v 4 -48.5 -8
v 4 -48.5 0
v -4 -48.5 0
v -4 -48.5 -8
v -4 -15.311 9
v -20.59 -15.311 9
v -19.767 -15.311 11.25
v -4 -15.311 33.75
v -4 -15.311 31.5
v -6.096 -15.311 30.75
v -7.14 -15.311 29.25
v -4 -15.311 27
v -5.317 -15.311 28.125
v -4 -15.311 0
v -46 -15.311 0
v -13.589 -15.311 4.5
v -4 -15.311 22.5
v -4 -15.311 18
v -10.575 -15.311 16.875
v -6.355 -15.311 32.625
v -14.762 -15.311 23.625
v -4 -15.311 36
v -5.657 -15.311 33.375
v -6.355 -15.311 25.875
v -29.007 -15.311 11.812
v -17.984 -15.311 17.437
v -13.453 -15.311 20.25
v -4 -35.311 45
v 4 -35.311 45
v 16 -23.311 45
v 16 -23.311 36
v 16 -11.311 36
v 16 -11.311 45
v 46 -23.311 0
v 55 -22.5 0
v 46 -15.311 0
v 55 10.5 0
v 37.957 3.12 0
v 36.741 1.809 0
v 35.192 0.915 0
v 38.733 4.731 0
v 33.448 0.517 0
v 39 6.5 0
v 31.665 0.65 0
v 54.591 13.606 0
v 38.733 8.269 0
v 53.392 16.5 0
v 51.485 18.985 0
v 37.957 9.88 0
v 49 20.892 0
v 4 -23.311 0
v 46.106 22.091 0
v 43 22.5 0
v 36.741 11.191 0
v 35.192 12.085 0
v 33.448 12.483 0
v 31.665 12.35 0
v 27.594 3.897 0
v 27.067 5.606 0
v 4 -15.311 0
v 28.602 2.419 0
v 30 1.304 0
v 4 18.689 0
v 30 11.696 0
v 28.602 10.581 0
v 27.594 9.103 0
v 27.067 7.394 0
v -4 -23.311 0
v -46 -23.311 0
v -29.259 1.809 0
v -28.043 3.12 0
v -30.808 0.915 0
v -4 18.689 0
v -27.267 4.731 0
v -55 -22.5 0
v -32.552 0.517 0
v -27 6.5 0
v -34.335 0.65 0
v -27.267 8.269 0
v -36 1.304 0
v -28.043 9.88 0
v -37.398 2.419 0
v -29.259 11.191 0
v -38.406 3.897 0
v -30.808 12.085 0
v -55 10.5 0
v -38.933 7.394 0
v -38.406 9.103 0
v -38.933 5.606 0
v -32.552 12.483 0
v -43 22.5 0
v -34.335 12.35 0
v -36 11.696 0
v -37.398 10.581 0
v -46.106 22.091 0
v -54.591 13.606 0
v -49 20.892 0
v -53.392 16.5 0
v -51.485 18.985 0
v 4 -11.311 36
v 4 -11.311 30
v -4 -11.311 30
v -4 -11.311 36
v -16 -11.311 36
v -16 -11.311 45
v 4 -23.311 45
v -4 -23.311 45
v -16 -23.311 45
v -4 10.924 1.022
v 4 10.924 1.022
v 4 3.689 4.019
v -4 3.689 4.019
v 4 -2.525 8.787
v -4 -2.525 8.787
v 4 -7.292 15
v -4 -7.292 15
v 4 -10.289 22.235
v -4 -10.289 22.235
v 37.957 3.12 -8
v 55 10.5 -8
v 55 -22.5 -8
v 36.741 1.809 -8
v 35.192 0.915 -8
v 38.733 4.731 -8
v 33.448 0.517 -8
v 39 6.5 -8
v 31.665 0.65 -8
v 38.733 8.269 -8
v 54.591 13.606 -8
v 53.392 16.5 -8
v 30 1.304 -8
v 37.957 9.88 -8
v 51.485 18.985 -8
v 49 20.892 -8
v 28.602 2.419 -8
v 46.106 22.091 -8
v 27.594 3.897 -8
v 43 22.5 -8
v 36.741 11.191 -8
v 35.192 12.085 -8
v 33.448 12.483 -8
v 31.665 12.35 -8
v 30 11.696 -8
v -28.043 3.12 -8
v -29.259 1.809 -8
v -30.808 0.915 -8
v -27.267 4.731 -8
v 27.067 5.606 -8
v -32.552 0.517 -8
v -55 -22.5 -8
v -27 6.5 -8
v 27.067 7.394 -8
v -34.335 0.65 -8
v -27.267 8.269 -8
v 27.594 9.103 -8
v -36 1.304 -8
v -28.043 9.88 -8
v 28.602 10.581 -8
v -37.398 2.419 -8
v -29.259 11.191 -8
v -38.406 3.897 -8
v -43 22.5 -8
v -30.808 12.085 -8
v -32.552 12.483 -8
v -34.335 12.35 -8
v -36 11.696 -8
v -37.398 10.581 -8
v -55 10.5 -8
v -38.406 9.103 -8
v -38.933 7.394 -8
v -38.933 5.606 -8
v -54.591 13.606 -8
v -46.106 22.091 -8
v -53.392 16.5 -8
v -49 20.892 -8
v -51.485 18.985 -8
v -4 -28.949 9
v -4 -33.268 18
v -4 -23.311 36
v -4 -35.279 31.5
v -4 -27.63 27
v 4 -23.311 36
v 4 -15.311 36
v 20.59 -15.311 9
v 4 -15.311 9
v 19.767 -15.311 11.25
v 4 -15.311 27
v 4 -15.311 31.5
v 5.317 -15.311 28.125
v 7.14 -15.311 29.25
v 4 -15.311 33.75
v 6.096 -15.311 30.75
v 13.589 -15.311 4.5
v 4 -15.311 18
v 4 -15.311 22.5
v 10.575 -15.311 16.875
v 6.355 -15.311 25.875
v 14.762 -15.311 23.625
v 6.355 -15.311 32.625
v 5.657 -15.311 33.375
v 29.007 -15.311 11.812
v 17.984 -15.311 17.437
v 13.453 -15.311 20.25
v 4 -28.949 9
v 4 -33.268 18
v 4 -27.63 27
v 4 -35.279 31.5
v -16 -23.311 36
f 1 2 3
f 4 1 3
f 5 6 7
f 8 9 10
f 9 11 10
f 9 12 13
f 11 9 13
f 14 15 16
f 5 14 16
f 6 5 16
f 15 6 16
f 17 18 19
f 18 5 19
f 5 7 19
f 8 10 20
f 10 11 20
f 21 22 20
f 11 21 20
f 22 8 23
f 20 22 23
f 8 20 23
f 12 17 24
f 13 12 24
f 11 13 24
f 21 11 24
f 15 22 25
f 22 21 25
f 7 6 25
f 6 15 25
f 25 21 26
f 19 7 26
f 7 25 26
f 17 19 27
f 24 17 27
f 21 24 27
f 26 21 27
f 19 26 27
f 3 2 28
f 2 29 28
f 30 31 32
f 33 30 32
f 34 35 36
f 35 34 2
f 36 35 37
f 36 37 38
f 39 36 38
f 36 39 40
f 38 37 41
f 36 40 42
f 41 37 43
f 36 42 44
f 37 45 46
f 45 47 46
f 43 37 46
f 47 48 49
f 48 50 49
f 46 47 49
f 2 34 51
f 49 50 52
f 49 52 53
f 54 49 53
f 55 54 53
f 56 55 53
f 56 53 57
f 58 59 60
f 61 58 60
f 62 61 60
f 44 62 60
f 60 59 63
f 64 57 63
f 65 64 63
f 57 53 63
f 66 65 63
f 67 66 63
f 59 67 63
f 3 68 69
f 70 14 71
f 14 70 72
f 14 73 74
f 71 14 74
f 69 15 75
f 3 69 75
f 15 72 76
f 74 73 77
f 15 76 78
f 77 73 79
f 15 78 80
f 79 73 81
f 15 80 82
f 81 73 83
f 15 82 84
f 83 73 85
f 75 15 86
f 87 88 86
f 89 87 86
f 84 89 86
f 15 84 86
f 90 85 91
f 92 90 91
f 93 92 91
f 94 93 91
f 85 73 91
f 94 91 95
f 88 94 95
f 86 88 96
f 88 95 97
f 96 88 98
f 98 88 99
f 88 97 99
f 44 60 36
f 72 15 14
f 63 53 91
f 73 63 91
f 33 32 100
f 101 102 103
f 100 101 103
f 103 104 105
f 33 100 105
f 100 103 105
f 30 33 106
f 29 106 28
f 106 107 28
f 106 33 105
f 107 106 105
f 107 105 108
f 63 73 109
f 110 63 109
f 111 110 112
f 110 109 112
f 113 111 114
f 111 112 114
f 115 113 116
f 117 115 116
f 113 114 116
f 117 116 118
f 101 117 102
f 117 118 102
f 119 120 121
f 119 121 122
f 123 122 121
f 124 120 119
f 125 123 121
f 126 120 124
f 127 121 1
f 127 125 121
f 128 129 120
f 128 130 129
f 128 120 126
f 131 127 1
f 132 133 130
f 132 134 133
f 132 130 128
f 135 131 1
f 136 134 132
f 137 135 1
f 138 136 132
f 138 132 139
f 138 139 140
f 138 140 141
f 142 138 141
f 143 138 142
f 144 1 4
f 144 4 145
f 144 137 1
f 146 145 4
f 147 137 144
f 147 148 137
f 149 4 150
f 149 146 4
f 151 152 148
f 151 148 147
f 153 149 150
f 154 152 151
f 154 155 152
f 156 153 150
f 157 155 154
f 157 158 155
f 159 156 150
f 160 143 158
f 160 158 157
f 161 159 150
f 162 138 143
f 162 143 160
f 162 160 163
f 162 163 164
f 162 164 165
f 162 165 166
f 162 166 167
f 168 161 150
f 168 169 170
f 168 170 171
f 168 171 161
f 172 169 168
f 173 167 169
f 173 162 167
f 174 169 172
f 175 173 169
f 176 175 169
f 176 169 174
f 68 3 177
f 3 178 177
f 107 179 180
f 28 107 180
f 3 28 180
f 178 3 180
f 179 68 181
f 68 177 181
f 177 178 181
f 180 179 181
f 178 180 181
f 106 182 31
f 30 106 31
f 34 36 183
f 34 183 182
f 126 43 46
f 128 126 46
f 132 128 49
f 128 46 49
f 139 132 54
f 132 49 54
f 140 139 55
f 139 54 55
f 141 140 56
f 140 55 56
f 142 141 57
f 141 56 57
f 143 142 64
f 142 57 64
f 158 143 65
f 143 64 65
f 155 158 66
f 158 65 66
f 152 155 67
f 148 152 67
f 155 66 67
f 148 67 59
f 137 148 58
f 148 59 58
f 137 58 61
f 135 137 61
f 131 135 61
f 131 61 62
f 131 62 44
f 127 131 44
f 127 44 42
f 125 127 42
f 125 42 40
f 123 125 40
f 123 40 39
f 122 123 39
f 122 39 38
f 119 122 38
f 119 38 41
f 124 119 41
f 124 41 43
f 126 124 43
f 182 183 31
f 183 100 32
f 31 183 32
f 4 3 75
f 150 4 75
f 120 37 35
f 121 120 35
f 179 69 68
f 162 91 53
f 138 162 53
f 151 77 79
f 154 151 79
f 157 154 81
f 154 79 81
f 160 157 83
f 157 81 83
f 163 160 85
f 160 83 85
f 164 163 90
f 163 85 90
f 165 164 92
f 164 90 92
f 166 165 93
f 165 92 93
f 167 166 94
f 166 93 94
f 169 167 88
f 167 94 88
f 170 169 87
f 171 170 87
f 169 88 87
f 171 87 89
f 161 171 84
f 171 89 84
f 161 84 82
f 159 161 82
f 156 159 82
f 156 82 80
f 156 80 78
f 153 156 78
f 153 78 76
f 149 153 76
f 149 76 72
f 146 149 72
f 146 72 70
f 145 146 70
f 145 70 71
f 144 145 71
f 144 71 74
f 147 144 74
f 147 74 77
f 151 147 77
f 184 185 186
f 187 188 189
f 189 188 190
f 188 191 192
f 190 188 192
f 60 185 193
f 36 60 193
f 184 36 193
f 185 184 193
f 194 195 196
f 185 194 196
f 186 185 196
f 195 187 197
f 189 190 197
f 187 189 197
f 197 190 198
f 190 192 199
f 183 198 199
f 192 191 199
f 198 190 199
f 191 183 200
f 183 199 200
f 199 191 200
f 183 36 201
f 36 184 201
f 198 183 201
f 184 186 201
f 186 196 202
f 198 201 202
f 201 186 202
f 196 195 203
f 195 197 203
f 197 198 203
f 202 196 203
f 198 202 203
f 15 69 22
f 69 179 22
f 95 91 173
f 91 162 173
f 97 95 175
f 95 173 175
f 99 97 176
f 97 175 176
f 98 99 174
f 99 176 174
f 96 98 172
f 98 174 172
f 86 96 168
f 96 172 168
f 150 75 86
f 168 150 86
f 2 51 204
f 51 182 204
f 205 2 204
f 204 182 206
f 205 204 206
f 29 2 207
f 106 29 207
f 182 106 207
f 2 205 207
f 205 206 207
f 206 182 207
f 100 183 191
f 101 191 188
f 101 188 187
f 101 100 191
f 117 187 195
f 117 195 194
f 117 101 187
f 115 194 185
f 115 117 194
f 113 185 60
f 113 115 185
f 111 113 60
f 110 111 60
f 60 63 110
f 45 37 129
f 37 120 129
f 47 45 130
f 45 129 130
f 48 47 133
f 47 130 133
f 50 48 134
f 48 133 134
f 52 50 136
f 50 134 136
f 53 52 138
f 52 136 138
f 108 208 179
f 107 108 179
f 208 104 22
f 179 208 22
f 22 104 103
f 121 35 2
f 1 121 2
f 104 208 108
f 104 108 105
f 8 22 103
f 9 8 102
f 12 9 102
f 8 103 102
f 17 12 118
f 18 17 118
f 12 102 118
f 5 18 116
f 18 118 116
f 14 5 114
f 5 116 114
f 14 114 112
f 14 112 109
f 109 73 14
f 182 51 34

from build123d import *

# Parameters (mm, degrees)
BOSS_EXTRUDE1_DEPTH = 8
SKETCH4_W           = 32
SKETCH4_H           = 12
BOSS_EXTRUDE3_DEPTH = 9
RIB1_START          = -4
RIB1_DEPTH          = 8
FILLET1_R           = 12
SKETCH8_R           = 6
CUT_EXTRUDE1_DEPTH  = 9


# Read off the part's stored shape, not the designer's step: Rib1
with BuildPart() as part:
    # Sketch1 → Boss-Extrude1 (new body)
    with BuildSketch(Plane.XY):
        Polygon((-55, 22.5), (55, 22.5), (55, -22.5), (4, -48.5), (-4, -48.5), (-55, -22.5), align=None)
    extrude(amount=-BOSS_EXTRUDE1_DEPTH)

    # Sketch2 → Loft1 section 0
    with BuildSketch(Plane.XY):
        with BuildLine():
            Line((-46, -15.311496361), (46, -15.311496361))
            Line((46, -15.311496361), (46, -23.311496361))
            Line((46, -23.311496361), (-46, -23.311496361))
            Line((-46, -23.311496361), (-46, -15.311496361))
        make_face()
    # Sketch3 → Loft1 section 1
    with BuildSketch(Plane.XY.offset(36)):
        with BuildLine():
            Line((-4, -15.311496361), (4, -15.311496361))
            Line((4, -15.311496361), (4, -23.311496361))
            Line((4, -23.311496361), (-4, -23.311496361))
            Line((-4, -23.311496361), (-4, -15.311496361))
        make_face()
    loft()

    # Sketch4 → Boss-Extrude3 (add)
    with BuildSketch(Plane.XY.offset(36)):
        with Locations((0, -17.311496361)):
            Rectangle(SKETCH4_W, SKETCH4_H)
    extrude(amount=BOSS_EXTRUDE3_DEPTH)

    # Sketch6 → Loft3 section 0
    with BuildSketch(Plane.XY):
        with BuildLine():
            Line((-4, -23.311496361), (4, -23.311496361))
            Line((4, -23.311496361), (4, -48.5))
            Line((4, -48.5), (-4, -48.5))
            Line((-4, -48.5), (-4, -23.311496361))
        make_face()
    # Sketch5 → Loft3 section 1
    with BuildSketch(Plane.XY.offset(45)):
        with BuildLine():
            Line((-4, -35.311496361), (4, -35.311496361))
            Line((4, -35.311496361), (4, -23.311496361))
            Line((4, -23.311496361), (-4, -23.311496361))
            Line((-4, -23.311496361), (-4, -35.311496361))
        make_face()
    loft()

    # Rib1 outline → Rib1 (add)
    with BuildSketch(Plane(origin=(0, 0, 0), x_dir=(0, 0, -1), z_dir=(1, 0, 0)).offset(RIB1_START)):
        with BuildLine():
            Line((-30, -11.311496361), (-36, -11.311496361))
            Line((-36, -11.311496361), (-36, -15.311496361))
            Line((-36, -15.311496361), (0, -15.311496361))
            Line((0, -15.311496361), (0, 18.688503639))
            ThreePointArc((0, 18.688503639), (-8.786796565, -2.524699797), (-30, -11.311496361))
        make_face()
    extrude(amount=RIB1_DEPTH)

    # Fillet1
    fillet1_edges = [part.edges().sort_by_distance(p)[0] for p in [
        (-55, 22.5, -4),
        (55, 22.5, -4),
    ]]
    fillet(fillet1_edges, radius=FILLET1_R)

    # Sketch8 → Cut-Extrude1 (cut)
    with BuildSketch(Plane.XY):
        with Locations((-33, 6.5)):
            Circle(SKETCH8_R)
        with Locations((33, 6.5)):
            Circle(SKETCH8_R)
    extrude(amount=-CUT_EXTRUDE1_DEPTH, mode=Mode.SUBTRACT)


solid = part.part
